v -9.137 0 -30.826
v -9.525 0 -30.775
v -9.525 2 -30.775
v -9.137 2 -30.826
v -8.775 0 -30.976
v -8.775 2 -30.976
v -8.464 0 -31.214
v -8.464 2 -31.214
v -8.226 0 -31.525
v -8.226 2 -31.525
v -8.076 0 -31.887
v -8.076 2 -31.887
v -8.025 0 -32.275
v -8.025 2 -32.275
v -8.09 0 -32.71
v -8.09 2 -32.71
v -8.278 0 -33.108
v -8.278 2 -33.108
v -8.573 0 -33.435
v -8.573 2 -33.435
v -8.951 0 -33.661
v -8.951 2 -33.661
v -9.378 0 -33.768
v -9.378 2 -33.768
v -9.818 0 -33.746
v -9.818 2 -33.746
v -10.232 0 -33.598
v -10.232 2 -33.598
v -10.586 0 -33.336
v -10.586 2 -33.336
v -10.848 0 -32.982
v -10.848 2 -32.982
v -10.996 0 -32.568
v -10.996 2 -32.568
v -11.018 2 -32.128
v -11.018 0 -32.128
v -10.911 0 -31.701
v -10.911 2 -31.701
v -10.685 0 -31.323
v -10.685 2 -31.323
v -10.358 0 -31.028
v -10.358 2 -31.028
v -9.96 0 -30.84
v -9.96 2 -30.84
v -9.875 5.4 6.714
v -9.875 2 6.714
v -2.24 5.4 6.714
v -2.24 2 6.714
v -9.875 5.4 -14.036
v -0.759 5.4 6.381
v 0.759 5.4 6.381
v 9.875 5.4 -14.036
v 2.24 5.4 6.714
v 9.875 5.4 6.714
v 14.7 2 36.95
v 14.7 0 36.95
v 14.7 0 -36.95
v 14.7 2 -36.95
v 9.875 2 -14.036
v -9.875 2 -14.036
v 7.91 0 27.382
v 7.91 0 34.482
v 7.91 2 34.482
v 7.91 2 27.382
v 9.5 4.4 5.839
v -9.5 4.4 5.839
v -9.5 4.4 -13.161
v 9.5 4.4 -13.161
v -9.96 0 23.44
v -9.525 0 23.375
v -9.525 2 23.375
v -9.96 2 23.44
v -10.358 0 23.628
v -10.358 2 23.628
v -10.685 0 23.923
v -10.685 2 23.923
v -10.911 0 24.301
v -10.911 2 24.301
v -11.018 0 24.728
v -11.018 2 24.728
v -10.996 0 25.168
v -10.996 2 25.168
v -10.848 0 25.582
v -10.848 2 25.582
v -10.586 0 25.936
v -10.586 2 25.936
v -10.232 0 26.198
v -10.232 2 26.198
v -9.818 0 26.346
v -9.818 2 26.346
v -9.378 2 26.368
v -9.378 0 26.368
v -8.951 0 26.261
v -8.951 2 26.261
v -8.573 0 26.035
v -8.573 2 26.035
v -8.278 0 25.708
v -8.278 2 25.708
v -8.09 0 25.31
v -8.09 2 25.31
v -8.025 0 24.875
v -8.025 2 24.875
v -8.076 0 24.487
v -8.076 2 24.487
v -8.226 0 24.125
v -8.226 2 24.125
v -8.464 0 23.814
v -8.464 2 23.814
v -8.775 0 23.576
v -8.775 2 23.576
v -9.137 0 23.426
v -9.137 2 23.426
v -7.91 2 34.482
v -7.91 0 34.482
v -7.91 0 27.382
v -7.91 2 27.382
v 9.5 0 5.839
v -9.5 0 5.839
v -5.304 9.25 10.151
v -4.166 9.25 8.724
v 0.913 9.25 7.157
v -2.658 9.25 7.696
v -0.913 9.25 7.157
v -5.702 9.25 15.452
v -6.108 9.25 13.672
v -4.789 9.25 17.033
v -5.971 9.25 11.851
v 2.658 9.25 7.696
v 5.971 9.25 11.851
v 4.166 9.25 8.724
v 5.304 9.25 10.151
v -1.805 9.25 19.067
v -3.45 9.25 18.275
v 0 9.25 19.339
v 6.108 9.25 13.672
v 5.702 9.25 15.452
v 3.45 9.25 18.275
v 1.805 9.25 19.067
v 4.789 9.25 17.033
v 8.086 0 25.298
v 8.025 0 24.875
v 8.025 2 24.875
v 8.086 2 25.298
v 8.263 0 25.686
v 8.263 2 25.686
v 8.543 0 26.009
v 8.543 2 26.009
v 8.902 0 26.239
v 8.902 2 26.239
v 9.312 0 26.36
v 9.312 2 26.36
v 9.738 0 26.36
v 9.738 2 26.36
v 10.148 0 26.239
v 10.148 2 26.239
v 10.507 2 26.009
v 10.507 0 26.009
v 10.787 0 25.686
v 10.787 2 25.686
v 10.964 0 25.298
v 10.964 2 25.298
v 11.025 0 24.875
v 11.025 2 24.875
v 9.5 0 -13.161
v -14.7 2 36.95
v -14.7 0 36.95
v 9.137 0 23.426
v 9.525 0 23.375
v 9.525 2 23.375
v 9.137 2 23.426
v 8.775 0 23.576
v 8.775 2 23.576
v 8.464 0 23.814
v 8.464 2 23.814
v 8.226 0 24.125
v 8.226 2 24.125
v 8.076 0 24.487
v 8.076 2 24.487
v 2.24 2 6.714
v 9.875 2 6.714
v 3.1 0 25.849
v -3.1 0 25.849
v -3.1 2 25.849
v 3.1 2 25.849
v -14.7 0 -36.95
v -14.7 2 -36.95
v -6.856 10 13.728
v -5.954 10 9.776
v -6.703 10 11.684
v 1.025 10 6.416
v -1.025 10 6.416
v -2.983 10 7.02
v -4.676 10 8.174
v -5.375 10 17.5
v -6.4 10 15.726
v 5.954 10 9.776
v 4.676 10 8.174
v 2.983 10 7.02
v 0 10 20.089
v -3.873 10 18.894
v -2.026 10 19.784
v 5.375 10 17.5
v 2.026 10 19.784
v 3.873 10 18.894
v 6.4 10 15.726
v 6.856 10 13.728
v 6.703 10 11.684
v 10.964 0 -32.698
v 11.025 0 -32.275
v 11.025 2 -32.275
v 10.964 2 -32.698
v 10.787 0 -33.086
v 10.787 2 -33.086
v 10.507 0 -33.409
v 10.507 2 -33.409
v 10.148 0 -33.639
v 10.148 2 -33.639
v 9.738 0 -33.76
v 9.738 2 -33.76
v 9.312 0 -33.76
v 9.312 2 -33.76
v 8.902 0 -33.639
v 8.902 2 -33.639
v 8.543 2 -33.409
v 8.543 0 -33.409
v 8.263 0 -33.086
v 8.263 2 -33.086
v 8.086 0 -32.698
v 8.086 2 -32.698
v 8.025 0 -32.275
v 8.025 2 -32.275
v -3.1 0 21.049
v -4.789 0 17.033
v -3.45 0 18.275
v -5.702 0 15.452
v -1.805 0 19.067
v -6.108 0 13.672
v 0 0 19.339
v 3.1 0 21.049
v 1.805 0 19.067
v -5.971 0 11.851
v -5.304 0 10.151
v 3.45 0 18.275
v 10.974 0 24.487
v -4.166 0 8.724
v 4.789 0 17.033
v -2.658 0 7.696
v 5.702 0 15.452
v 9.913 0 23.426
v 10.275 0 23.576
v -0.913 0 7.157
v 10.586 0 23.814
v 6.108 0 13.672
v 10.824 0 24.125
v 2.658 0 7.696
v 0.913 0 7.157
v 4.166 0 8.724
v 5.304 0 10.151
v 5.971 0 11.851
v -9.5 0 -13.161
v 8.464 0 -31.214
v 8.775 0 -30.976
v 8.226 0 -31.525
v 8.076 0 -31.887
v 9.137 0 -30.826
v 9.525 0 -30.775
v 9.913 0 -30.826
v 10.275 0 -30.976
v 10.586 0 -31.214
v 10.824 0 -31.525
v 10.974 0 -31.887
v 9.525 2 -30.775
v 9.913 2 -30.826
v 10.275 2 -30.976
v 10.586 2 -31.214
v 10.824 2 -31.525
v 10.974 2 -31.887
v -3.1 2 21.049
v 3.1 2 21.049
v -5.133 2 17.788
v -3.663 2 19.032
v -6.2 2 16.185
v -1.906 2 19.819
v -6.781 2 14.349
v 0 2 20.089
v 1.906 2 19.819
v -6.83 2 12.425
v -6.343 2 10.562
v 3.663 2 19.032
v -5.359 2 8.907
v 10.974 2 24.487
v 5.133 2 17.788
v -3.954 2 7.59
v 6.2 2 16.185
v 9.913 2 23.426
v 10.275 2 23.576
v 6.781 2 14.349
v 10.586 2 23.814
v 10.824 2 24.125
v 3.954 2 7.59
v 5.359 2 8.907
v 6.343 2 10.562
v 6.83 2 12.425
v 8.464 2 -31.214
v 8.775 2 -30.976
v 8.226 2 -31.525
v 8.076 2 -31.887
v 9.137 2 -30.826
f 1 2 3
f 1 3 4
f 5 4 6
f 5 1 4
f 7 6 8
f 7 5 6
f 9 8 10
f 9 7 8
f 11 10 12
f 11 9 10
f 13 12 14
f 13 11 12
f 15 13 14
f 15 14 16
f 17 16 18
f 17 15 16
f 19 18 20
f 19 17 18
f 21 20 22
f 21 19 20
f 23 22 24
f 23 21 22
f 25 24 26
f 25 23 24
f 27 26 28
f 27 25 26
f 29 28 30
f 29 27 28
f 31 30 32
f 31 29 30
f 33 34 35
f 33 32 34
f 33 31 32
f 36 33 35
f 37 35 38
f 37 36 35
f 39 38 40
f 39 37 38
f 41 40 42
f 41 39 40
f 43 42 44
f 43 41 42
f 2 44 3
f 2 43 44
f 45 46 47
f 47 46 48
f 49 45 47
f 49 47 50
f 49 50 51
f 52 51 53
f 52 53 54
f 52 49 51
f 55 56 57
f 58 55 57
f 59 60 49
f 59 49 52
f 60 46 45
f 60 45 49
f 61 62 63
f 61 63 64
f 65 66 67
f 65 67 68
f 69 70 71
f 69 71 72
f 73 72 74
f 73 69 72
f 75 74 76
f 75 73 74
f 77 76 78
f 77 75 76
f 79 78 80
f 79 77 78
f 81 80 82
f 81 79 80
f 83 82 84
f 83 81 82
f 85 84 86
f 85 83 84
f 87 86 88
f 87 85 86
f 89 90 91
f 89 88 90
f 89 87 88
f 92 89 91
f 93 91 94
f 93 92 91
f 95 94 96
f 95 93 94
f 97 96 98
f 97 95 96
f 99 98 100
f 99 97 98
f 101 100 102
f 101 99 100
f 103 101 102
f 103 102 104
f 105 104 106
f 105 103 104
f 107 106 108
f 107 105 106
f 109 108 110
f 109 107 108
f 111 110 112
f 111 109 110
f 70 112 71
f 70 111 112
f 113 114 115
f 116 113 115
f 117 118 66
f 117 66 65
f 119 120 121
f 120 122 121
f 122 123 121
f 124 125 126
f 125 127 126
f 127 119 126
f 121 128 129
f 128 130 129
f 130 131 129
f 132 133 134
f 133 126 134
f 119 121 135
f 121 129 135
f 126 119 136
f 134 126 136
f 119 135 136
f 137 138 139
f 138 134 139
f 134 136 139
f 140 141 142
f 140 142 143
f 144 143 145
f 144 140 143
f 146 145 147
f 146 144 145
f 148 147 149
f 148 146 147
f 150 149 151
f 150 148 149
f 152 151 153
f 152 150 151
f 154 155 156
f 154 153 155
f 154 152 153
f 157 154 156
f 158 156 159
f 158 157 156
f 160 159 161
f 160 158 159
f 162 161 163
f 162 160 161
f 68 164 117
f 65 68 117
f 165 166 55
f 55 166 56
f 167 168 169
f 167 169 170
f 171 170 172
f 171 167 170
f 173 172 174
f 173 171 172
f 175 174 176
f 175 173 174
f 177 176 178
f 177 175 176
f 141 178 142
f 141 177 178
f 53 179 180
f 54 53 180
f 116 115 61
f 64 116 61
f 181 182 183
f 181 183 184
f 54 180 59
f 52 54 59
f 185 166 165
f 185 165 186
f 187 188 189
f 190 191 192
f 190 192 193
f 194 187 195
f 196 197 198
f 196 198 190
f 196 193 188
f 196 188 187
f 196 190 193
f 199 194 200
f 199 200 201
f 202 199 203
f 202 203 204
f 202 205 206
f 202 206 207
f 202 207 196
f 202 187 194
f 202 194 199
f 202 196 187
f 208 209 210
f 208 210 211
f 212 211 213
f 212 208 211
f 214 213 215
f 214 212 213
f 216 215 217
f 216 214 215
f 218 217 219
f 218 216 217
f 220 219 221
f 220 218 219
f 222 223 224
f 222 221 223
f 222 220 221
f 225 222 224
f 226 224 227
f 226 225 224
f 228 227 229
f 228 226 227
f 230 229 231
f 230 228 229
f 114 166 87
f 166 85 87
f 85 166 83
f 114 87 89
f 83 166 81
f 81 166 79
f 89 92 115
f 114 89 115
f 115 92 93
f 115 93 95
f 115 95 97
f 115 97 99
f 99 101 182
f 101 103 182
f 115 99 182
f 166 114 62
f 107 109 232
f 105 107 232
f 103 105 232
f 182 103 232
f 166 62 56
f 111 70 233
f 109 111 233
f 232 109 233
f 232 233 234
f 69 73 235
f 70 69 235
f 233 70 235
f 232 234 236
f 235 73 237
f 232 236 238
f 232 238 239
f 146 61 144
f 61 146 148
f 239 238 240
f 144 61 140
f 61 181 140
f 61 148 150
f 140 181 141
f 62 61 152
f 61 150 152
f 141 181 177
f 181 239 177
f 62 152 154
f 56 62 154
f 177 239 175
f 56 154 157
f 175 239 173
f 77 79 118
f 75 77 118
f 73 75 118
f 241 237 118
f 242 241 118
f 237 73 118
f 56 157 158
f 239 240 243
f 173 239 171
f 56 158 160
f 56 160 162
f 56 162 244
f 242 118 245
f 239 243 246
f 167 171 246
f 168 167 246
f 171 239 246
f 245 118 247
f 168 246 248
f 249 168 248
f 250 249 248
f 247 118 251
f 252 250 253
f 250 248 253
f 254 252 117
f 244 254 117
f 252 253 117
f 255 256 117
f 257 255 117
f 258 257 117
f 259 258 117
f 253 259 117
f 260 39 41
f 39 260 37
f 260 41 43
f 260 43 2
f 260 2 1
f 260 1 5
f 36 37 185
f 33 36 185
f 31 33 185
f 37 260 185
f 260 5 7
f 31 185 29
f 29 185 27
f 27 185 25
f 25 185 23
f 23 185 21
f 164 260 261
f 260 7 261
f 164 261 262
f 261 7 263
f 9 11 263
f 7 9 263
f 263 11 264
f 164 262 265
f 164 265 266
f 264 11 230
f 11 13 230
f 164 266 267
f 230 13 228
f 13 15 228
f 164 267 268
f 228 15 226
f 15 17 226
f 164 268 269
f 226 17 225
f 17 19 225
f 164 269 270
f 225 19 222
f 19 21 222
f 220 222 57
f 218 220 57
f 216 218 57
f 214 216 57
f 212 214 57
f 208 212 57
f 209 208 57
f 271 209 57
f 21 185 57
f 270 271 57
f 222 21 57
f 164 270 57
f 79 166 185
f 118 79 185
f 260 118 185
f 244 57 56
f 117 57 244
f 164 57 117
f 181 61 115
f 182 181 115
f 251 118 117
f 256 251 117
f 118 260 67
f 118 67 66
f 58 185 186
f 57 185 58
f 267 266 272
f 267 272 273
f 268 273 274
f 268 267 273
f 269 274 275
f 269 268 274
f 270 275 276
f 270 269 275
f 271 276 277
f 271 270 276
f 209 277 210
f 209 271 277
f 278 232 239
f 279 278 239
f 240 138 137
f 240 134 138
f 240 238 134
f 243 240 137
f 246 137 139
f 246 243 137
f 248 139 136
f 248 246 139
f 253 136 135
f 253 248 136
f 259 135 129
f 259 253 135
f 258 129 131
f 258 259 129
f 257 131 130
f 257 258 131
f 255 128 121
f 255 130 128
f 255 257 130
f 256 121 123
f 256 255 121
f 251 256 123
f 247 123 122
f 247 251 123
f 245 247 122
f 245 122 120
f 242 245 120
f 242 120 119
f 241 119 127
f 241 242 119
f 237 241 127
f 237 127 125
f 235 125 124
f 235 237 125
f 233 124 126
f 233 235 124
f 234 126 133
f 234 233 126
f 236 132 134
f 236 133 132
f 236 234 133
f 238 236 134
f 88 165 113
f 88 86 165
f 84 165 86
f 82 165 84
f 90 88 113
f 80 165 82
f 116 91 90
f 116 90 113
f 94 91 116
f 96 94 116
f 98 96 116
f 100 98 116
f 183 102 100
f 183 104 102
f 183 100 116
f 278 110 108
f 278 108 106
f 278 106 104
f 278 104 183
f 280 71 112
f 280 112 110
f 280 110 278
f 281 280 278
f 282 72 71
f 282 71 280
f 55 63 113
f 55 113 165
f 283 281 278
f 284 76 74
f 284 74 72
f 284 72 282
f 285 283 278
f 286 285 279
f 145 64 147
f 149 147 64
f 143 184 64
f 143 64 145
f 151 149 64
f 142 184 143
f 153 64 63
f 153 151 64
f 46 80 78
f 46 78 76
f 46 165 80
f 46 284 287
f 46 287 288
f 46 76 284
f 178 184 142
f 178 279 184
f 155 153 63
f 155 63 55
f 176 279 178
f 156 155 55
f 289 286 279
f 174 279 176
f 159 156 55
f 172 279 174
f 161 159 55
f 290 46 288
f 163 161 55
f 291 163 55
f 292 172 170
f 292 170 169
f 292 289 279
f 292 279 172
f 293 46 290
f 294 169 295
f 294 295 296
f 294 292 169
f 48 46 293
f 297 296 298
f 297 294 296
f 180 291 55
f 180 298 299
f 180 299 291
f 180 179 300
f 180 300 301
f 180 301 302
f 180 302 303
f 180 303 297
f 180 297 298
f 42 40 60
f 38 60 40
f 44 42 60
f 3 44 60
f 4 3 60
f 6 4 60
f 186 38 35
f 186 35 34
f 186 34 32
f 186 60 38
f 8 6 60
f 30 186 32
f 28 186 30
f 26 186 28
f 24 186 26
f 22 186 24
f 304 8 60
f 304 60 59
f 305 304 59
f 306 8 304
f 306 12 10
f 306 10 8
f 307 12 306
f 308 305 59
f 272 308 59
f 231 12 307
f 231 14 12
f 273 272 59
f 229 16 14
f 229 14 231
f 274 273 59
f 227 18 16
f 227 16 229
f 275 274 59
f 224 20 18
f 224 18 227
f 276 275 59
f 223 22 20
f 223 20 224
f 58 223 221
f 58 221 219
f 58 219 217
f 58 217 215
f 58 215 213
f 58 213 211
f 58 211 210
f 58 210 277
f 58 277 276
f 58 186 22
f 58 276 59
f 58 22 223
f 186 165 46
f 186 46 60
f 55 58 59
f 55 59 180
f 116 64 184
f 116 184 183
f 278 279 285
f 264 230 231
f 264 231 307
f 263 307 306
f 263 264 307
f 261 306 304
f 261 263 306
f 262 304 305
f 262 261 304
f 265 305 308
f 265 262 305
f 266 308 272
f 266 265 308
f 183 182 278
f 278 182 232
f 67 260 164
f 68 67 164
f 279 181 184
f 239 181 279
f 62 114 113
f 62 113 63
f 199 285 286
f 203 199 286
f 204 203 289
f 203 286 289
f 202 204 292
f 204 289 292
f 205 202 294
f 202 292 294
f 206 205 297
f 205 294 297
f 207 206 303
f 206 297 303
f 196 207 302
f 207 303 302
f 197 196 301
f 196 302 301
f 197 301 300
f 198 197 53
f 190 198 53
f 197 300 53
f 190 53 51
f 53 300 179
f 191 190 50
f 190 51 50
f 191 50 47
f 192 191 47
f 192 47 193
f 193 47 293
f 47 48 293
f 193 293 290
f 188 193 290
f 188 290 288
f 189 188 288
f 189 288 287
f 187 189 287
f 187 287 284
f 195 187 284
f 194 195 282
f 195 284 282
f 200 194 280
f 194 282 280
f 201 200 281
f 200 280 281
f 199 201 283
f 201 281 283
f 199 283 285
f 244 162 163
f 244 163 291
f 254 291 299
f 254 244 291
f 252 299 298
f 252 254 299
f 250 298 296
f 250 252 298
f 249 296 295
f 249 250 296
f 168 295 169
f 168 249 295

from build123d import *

# Parameters (mm, degrees)
SKETCH1_W               = 29.4
SKETCH1_H               = 73.9
SKETCH1_W_2             = 15.82
SKETCH1_H_2             = 7.1
SKETCH1_W_3             = 6.2
SKETCH1_H_3             = 4.8
BOSS_EXTRUDE1_DEPTH     = 2
SKETCH1_3_R             = 6.875
BOSS_EXTRUDE2_DEPTH     = 10
SHELL1_T                = -0.75
SKETCH1_4_W             = 19.75
SKETCH1_4_H             = 20.75
BOSS_EXTRUDE3_DEPTH     = 5.4
SKETCH2_W               = 19
SKETCH2_H               = 19
CUT_EXTRUDE1_DEPTH      = 4.4
CUT_EXTRUDE2_DEPTH      = 41.563437971
CUT_EXTRUDE2_DEPTH_BACK = 41.563437971


with BuildPart() as part:
    # Sketch1 → Boss-Extrude1 (new body)
    with BuildSketch(Plane(origin=(0, 0, 0), x_dir=(1, 0, 0), z_dir=(0, 1, 0))):
        Rectangle(SKETCH1_W, SKETCH1_H)
        with Locations((0, -30.932)):
            Rectangle(SKETCH1_W_2, SKETCH1_H_2, mode=Mode.SUBTRACT)
        with Locations((0, -23.449)):
            Rectangle(SKETCH1_W_3, SKETCH1_H_3, mode=Mode.SUBTRACT)
        with BuildLine():
            Line((-9.875, 14.036), (9.875, 14.036))
            Line((9.875, 14.036), (9.875, -6.714))
            Line((9.875, -6.714), (2.239559108, -6.714))
            ThreePointArc((2.239559108, -6.714), (0, -20.089), (-2.239559108, -6.714))
            Line((-2.239559108, -6.714), (-9.875, -6.714))
            Line((-9.875, -6.714), (-9.875, 14.036))
        make_face(mode=Mode.SUBTRACT)
    extrude(amount=BOSS_EXTRUDE1_DEPTH)



with BuildPart() as body_2:
    # Sketch1<3> → Boss-Extrude2 (new body)
    with BuildSketch(Plane(origin=(0, 0, 0), x_dir=(1, 0, 0), z_dir=(0, 1, 0))):
        with Locations(Location((0, -13.214, 0), (0, 0, 270))):
            Circle(SKETCH1_3_R)
    extrude(amount=BOSS_EXTRUDE2_DEPTH)

    # Shell1
    shell1_openings = [body_2.faces().sort_by_distance(p)[0] for p in [
        (0, 0, 13.214),
    ]]
    offset(amount=SHELL1_T, openings=shell1_openings, kind=Kind.INTERSECTION)


with BuildPart() as part_1:
    add(part.part)

    add(body_2.part)  # Boss-Extrude3 merges body 2
    # Sketch1<4> → Boss-Extrude3 (add)
    with BuildSketch(Plane(origin=(0, 0, 0), x_dir=(1, 0, 0), z_dir=(0, 1, 0))):
        with Locations((0, 3.661)):
            Rectangle(SKETCH1_4_W, SKETCH1_4_H)
    extrude(amount=BOSS_EXTRUDE3_DEPTH)

    # Sketch2 → Cut-Extrude1 (cut)
    with BuildSketch(Plane.XZ):
        with Locations((0, -3.661)):
            Rectangle(SKETCH2_W, SKETCH2_H)
    extrude(amount=-CUT_EXTRUDE1_DEPTH, mode=Mode.SUBTRACT)

    # Sketch3 → Cut-Extrude2 (cut, two sides: drawn at the far end of the back side and taken through both)
    with BuildSketch(Plane(origin=(0, 2, 0), x_dir=(1, 0, 0), z_dir=(0, 1, 0)).offset(-CUT_EXTRUDE2_DEPTH_BACK)):
        with BuildLine():
            Line((-9.525, 30.775), (-9.525, 32.275))
            Line((-9.525, 32.275), (-8.025, 32.275))
            ThreePointArc((-8.025, 32.275), (-10.585660172, 33.335660172), (-9.525, 30.775))
        make_face()
        with BuildLine():
            Line((-8.025, 32.275), (-9.525, 32.275))
            Line((-9.525, 32.275), (-9.525, 30.775))
            ThreePointArc((-9.525, 30.775), (-8.464339828, 31.214339828), (-8.025, 32.275))
        make_face()
        with BuildLine():
            ThreePointArc((11.025, 32.275), (9.525, 33.775), (8.025, 32.275))
            Line((8.025, 32.275), (9.525, 32.275))
            Line((9.525, 32.275), (9.525, 30.775))
            ThreePointArc((9.525, 30.775), (10.585660172, 31.214339828), (11.025, 32.275))
        make_face()
        with BuildLine():
            Line((9.525, 32.275), (8.025, 32.275))
            ThreePointArc((8.025, 32.275), (8.464339828, 31.214339828), (9.525, 30.775))
            Line((9.525, 30.775), (9.525, 32.275))
        make_face()
        with BuildLine():
            ThreePointArc((11.025, -24.875), (10.585660172, -23.814339828), (9.525, -23.375))
            Line((9.525, -23.375), (9.525, -24.875))
            Line((9.525, -24.875), (8.025, -24.875))
            ThreePointArc((8.025, -24.875), (9.525, -26.375), (11.025, -24.875))
        make_face()
        with BuildLine():
            Line((9.525, -24.875), (9.525, -23.375))
            ThreePointArc((9.525, -23.375), (8.464339828, -23.814339828), (8.025, -24.875))
            Line((8.025, -24.875), (9.525, -24.875))
        make_face()
        with BuildLine():
            ThreePointArc((-8.025, -24.875), (-8.464339828, -23.814339828), (-9.525, -23.375))
            Line((-9.525, -23.375), (-9.525, -24.875))
            Line((-9.525, -24.875), (-8.025, -24.875))
        make_face()
        with BuildLine():
            Line((-9.525, -24.875), (-9.525, -23.375))
            ThreePointArc((-9.525, -23.375), (-10.585660172, -25.935660172), (-8.025, -24.875))
            Line((-8.025, -24.875), (-9.525, -24.875))
        make_face()
    extrude(amount=CUT_EXTRUDE2_DEPTH + CUT_EXTRUDE2_DEPTH_BACK, mode=Mode.SUBTRACT)


solid = part_1.part
